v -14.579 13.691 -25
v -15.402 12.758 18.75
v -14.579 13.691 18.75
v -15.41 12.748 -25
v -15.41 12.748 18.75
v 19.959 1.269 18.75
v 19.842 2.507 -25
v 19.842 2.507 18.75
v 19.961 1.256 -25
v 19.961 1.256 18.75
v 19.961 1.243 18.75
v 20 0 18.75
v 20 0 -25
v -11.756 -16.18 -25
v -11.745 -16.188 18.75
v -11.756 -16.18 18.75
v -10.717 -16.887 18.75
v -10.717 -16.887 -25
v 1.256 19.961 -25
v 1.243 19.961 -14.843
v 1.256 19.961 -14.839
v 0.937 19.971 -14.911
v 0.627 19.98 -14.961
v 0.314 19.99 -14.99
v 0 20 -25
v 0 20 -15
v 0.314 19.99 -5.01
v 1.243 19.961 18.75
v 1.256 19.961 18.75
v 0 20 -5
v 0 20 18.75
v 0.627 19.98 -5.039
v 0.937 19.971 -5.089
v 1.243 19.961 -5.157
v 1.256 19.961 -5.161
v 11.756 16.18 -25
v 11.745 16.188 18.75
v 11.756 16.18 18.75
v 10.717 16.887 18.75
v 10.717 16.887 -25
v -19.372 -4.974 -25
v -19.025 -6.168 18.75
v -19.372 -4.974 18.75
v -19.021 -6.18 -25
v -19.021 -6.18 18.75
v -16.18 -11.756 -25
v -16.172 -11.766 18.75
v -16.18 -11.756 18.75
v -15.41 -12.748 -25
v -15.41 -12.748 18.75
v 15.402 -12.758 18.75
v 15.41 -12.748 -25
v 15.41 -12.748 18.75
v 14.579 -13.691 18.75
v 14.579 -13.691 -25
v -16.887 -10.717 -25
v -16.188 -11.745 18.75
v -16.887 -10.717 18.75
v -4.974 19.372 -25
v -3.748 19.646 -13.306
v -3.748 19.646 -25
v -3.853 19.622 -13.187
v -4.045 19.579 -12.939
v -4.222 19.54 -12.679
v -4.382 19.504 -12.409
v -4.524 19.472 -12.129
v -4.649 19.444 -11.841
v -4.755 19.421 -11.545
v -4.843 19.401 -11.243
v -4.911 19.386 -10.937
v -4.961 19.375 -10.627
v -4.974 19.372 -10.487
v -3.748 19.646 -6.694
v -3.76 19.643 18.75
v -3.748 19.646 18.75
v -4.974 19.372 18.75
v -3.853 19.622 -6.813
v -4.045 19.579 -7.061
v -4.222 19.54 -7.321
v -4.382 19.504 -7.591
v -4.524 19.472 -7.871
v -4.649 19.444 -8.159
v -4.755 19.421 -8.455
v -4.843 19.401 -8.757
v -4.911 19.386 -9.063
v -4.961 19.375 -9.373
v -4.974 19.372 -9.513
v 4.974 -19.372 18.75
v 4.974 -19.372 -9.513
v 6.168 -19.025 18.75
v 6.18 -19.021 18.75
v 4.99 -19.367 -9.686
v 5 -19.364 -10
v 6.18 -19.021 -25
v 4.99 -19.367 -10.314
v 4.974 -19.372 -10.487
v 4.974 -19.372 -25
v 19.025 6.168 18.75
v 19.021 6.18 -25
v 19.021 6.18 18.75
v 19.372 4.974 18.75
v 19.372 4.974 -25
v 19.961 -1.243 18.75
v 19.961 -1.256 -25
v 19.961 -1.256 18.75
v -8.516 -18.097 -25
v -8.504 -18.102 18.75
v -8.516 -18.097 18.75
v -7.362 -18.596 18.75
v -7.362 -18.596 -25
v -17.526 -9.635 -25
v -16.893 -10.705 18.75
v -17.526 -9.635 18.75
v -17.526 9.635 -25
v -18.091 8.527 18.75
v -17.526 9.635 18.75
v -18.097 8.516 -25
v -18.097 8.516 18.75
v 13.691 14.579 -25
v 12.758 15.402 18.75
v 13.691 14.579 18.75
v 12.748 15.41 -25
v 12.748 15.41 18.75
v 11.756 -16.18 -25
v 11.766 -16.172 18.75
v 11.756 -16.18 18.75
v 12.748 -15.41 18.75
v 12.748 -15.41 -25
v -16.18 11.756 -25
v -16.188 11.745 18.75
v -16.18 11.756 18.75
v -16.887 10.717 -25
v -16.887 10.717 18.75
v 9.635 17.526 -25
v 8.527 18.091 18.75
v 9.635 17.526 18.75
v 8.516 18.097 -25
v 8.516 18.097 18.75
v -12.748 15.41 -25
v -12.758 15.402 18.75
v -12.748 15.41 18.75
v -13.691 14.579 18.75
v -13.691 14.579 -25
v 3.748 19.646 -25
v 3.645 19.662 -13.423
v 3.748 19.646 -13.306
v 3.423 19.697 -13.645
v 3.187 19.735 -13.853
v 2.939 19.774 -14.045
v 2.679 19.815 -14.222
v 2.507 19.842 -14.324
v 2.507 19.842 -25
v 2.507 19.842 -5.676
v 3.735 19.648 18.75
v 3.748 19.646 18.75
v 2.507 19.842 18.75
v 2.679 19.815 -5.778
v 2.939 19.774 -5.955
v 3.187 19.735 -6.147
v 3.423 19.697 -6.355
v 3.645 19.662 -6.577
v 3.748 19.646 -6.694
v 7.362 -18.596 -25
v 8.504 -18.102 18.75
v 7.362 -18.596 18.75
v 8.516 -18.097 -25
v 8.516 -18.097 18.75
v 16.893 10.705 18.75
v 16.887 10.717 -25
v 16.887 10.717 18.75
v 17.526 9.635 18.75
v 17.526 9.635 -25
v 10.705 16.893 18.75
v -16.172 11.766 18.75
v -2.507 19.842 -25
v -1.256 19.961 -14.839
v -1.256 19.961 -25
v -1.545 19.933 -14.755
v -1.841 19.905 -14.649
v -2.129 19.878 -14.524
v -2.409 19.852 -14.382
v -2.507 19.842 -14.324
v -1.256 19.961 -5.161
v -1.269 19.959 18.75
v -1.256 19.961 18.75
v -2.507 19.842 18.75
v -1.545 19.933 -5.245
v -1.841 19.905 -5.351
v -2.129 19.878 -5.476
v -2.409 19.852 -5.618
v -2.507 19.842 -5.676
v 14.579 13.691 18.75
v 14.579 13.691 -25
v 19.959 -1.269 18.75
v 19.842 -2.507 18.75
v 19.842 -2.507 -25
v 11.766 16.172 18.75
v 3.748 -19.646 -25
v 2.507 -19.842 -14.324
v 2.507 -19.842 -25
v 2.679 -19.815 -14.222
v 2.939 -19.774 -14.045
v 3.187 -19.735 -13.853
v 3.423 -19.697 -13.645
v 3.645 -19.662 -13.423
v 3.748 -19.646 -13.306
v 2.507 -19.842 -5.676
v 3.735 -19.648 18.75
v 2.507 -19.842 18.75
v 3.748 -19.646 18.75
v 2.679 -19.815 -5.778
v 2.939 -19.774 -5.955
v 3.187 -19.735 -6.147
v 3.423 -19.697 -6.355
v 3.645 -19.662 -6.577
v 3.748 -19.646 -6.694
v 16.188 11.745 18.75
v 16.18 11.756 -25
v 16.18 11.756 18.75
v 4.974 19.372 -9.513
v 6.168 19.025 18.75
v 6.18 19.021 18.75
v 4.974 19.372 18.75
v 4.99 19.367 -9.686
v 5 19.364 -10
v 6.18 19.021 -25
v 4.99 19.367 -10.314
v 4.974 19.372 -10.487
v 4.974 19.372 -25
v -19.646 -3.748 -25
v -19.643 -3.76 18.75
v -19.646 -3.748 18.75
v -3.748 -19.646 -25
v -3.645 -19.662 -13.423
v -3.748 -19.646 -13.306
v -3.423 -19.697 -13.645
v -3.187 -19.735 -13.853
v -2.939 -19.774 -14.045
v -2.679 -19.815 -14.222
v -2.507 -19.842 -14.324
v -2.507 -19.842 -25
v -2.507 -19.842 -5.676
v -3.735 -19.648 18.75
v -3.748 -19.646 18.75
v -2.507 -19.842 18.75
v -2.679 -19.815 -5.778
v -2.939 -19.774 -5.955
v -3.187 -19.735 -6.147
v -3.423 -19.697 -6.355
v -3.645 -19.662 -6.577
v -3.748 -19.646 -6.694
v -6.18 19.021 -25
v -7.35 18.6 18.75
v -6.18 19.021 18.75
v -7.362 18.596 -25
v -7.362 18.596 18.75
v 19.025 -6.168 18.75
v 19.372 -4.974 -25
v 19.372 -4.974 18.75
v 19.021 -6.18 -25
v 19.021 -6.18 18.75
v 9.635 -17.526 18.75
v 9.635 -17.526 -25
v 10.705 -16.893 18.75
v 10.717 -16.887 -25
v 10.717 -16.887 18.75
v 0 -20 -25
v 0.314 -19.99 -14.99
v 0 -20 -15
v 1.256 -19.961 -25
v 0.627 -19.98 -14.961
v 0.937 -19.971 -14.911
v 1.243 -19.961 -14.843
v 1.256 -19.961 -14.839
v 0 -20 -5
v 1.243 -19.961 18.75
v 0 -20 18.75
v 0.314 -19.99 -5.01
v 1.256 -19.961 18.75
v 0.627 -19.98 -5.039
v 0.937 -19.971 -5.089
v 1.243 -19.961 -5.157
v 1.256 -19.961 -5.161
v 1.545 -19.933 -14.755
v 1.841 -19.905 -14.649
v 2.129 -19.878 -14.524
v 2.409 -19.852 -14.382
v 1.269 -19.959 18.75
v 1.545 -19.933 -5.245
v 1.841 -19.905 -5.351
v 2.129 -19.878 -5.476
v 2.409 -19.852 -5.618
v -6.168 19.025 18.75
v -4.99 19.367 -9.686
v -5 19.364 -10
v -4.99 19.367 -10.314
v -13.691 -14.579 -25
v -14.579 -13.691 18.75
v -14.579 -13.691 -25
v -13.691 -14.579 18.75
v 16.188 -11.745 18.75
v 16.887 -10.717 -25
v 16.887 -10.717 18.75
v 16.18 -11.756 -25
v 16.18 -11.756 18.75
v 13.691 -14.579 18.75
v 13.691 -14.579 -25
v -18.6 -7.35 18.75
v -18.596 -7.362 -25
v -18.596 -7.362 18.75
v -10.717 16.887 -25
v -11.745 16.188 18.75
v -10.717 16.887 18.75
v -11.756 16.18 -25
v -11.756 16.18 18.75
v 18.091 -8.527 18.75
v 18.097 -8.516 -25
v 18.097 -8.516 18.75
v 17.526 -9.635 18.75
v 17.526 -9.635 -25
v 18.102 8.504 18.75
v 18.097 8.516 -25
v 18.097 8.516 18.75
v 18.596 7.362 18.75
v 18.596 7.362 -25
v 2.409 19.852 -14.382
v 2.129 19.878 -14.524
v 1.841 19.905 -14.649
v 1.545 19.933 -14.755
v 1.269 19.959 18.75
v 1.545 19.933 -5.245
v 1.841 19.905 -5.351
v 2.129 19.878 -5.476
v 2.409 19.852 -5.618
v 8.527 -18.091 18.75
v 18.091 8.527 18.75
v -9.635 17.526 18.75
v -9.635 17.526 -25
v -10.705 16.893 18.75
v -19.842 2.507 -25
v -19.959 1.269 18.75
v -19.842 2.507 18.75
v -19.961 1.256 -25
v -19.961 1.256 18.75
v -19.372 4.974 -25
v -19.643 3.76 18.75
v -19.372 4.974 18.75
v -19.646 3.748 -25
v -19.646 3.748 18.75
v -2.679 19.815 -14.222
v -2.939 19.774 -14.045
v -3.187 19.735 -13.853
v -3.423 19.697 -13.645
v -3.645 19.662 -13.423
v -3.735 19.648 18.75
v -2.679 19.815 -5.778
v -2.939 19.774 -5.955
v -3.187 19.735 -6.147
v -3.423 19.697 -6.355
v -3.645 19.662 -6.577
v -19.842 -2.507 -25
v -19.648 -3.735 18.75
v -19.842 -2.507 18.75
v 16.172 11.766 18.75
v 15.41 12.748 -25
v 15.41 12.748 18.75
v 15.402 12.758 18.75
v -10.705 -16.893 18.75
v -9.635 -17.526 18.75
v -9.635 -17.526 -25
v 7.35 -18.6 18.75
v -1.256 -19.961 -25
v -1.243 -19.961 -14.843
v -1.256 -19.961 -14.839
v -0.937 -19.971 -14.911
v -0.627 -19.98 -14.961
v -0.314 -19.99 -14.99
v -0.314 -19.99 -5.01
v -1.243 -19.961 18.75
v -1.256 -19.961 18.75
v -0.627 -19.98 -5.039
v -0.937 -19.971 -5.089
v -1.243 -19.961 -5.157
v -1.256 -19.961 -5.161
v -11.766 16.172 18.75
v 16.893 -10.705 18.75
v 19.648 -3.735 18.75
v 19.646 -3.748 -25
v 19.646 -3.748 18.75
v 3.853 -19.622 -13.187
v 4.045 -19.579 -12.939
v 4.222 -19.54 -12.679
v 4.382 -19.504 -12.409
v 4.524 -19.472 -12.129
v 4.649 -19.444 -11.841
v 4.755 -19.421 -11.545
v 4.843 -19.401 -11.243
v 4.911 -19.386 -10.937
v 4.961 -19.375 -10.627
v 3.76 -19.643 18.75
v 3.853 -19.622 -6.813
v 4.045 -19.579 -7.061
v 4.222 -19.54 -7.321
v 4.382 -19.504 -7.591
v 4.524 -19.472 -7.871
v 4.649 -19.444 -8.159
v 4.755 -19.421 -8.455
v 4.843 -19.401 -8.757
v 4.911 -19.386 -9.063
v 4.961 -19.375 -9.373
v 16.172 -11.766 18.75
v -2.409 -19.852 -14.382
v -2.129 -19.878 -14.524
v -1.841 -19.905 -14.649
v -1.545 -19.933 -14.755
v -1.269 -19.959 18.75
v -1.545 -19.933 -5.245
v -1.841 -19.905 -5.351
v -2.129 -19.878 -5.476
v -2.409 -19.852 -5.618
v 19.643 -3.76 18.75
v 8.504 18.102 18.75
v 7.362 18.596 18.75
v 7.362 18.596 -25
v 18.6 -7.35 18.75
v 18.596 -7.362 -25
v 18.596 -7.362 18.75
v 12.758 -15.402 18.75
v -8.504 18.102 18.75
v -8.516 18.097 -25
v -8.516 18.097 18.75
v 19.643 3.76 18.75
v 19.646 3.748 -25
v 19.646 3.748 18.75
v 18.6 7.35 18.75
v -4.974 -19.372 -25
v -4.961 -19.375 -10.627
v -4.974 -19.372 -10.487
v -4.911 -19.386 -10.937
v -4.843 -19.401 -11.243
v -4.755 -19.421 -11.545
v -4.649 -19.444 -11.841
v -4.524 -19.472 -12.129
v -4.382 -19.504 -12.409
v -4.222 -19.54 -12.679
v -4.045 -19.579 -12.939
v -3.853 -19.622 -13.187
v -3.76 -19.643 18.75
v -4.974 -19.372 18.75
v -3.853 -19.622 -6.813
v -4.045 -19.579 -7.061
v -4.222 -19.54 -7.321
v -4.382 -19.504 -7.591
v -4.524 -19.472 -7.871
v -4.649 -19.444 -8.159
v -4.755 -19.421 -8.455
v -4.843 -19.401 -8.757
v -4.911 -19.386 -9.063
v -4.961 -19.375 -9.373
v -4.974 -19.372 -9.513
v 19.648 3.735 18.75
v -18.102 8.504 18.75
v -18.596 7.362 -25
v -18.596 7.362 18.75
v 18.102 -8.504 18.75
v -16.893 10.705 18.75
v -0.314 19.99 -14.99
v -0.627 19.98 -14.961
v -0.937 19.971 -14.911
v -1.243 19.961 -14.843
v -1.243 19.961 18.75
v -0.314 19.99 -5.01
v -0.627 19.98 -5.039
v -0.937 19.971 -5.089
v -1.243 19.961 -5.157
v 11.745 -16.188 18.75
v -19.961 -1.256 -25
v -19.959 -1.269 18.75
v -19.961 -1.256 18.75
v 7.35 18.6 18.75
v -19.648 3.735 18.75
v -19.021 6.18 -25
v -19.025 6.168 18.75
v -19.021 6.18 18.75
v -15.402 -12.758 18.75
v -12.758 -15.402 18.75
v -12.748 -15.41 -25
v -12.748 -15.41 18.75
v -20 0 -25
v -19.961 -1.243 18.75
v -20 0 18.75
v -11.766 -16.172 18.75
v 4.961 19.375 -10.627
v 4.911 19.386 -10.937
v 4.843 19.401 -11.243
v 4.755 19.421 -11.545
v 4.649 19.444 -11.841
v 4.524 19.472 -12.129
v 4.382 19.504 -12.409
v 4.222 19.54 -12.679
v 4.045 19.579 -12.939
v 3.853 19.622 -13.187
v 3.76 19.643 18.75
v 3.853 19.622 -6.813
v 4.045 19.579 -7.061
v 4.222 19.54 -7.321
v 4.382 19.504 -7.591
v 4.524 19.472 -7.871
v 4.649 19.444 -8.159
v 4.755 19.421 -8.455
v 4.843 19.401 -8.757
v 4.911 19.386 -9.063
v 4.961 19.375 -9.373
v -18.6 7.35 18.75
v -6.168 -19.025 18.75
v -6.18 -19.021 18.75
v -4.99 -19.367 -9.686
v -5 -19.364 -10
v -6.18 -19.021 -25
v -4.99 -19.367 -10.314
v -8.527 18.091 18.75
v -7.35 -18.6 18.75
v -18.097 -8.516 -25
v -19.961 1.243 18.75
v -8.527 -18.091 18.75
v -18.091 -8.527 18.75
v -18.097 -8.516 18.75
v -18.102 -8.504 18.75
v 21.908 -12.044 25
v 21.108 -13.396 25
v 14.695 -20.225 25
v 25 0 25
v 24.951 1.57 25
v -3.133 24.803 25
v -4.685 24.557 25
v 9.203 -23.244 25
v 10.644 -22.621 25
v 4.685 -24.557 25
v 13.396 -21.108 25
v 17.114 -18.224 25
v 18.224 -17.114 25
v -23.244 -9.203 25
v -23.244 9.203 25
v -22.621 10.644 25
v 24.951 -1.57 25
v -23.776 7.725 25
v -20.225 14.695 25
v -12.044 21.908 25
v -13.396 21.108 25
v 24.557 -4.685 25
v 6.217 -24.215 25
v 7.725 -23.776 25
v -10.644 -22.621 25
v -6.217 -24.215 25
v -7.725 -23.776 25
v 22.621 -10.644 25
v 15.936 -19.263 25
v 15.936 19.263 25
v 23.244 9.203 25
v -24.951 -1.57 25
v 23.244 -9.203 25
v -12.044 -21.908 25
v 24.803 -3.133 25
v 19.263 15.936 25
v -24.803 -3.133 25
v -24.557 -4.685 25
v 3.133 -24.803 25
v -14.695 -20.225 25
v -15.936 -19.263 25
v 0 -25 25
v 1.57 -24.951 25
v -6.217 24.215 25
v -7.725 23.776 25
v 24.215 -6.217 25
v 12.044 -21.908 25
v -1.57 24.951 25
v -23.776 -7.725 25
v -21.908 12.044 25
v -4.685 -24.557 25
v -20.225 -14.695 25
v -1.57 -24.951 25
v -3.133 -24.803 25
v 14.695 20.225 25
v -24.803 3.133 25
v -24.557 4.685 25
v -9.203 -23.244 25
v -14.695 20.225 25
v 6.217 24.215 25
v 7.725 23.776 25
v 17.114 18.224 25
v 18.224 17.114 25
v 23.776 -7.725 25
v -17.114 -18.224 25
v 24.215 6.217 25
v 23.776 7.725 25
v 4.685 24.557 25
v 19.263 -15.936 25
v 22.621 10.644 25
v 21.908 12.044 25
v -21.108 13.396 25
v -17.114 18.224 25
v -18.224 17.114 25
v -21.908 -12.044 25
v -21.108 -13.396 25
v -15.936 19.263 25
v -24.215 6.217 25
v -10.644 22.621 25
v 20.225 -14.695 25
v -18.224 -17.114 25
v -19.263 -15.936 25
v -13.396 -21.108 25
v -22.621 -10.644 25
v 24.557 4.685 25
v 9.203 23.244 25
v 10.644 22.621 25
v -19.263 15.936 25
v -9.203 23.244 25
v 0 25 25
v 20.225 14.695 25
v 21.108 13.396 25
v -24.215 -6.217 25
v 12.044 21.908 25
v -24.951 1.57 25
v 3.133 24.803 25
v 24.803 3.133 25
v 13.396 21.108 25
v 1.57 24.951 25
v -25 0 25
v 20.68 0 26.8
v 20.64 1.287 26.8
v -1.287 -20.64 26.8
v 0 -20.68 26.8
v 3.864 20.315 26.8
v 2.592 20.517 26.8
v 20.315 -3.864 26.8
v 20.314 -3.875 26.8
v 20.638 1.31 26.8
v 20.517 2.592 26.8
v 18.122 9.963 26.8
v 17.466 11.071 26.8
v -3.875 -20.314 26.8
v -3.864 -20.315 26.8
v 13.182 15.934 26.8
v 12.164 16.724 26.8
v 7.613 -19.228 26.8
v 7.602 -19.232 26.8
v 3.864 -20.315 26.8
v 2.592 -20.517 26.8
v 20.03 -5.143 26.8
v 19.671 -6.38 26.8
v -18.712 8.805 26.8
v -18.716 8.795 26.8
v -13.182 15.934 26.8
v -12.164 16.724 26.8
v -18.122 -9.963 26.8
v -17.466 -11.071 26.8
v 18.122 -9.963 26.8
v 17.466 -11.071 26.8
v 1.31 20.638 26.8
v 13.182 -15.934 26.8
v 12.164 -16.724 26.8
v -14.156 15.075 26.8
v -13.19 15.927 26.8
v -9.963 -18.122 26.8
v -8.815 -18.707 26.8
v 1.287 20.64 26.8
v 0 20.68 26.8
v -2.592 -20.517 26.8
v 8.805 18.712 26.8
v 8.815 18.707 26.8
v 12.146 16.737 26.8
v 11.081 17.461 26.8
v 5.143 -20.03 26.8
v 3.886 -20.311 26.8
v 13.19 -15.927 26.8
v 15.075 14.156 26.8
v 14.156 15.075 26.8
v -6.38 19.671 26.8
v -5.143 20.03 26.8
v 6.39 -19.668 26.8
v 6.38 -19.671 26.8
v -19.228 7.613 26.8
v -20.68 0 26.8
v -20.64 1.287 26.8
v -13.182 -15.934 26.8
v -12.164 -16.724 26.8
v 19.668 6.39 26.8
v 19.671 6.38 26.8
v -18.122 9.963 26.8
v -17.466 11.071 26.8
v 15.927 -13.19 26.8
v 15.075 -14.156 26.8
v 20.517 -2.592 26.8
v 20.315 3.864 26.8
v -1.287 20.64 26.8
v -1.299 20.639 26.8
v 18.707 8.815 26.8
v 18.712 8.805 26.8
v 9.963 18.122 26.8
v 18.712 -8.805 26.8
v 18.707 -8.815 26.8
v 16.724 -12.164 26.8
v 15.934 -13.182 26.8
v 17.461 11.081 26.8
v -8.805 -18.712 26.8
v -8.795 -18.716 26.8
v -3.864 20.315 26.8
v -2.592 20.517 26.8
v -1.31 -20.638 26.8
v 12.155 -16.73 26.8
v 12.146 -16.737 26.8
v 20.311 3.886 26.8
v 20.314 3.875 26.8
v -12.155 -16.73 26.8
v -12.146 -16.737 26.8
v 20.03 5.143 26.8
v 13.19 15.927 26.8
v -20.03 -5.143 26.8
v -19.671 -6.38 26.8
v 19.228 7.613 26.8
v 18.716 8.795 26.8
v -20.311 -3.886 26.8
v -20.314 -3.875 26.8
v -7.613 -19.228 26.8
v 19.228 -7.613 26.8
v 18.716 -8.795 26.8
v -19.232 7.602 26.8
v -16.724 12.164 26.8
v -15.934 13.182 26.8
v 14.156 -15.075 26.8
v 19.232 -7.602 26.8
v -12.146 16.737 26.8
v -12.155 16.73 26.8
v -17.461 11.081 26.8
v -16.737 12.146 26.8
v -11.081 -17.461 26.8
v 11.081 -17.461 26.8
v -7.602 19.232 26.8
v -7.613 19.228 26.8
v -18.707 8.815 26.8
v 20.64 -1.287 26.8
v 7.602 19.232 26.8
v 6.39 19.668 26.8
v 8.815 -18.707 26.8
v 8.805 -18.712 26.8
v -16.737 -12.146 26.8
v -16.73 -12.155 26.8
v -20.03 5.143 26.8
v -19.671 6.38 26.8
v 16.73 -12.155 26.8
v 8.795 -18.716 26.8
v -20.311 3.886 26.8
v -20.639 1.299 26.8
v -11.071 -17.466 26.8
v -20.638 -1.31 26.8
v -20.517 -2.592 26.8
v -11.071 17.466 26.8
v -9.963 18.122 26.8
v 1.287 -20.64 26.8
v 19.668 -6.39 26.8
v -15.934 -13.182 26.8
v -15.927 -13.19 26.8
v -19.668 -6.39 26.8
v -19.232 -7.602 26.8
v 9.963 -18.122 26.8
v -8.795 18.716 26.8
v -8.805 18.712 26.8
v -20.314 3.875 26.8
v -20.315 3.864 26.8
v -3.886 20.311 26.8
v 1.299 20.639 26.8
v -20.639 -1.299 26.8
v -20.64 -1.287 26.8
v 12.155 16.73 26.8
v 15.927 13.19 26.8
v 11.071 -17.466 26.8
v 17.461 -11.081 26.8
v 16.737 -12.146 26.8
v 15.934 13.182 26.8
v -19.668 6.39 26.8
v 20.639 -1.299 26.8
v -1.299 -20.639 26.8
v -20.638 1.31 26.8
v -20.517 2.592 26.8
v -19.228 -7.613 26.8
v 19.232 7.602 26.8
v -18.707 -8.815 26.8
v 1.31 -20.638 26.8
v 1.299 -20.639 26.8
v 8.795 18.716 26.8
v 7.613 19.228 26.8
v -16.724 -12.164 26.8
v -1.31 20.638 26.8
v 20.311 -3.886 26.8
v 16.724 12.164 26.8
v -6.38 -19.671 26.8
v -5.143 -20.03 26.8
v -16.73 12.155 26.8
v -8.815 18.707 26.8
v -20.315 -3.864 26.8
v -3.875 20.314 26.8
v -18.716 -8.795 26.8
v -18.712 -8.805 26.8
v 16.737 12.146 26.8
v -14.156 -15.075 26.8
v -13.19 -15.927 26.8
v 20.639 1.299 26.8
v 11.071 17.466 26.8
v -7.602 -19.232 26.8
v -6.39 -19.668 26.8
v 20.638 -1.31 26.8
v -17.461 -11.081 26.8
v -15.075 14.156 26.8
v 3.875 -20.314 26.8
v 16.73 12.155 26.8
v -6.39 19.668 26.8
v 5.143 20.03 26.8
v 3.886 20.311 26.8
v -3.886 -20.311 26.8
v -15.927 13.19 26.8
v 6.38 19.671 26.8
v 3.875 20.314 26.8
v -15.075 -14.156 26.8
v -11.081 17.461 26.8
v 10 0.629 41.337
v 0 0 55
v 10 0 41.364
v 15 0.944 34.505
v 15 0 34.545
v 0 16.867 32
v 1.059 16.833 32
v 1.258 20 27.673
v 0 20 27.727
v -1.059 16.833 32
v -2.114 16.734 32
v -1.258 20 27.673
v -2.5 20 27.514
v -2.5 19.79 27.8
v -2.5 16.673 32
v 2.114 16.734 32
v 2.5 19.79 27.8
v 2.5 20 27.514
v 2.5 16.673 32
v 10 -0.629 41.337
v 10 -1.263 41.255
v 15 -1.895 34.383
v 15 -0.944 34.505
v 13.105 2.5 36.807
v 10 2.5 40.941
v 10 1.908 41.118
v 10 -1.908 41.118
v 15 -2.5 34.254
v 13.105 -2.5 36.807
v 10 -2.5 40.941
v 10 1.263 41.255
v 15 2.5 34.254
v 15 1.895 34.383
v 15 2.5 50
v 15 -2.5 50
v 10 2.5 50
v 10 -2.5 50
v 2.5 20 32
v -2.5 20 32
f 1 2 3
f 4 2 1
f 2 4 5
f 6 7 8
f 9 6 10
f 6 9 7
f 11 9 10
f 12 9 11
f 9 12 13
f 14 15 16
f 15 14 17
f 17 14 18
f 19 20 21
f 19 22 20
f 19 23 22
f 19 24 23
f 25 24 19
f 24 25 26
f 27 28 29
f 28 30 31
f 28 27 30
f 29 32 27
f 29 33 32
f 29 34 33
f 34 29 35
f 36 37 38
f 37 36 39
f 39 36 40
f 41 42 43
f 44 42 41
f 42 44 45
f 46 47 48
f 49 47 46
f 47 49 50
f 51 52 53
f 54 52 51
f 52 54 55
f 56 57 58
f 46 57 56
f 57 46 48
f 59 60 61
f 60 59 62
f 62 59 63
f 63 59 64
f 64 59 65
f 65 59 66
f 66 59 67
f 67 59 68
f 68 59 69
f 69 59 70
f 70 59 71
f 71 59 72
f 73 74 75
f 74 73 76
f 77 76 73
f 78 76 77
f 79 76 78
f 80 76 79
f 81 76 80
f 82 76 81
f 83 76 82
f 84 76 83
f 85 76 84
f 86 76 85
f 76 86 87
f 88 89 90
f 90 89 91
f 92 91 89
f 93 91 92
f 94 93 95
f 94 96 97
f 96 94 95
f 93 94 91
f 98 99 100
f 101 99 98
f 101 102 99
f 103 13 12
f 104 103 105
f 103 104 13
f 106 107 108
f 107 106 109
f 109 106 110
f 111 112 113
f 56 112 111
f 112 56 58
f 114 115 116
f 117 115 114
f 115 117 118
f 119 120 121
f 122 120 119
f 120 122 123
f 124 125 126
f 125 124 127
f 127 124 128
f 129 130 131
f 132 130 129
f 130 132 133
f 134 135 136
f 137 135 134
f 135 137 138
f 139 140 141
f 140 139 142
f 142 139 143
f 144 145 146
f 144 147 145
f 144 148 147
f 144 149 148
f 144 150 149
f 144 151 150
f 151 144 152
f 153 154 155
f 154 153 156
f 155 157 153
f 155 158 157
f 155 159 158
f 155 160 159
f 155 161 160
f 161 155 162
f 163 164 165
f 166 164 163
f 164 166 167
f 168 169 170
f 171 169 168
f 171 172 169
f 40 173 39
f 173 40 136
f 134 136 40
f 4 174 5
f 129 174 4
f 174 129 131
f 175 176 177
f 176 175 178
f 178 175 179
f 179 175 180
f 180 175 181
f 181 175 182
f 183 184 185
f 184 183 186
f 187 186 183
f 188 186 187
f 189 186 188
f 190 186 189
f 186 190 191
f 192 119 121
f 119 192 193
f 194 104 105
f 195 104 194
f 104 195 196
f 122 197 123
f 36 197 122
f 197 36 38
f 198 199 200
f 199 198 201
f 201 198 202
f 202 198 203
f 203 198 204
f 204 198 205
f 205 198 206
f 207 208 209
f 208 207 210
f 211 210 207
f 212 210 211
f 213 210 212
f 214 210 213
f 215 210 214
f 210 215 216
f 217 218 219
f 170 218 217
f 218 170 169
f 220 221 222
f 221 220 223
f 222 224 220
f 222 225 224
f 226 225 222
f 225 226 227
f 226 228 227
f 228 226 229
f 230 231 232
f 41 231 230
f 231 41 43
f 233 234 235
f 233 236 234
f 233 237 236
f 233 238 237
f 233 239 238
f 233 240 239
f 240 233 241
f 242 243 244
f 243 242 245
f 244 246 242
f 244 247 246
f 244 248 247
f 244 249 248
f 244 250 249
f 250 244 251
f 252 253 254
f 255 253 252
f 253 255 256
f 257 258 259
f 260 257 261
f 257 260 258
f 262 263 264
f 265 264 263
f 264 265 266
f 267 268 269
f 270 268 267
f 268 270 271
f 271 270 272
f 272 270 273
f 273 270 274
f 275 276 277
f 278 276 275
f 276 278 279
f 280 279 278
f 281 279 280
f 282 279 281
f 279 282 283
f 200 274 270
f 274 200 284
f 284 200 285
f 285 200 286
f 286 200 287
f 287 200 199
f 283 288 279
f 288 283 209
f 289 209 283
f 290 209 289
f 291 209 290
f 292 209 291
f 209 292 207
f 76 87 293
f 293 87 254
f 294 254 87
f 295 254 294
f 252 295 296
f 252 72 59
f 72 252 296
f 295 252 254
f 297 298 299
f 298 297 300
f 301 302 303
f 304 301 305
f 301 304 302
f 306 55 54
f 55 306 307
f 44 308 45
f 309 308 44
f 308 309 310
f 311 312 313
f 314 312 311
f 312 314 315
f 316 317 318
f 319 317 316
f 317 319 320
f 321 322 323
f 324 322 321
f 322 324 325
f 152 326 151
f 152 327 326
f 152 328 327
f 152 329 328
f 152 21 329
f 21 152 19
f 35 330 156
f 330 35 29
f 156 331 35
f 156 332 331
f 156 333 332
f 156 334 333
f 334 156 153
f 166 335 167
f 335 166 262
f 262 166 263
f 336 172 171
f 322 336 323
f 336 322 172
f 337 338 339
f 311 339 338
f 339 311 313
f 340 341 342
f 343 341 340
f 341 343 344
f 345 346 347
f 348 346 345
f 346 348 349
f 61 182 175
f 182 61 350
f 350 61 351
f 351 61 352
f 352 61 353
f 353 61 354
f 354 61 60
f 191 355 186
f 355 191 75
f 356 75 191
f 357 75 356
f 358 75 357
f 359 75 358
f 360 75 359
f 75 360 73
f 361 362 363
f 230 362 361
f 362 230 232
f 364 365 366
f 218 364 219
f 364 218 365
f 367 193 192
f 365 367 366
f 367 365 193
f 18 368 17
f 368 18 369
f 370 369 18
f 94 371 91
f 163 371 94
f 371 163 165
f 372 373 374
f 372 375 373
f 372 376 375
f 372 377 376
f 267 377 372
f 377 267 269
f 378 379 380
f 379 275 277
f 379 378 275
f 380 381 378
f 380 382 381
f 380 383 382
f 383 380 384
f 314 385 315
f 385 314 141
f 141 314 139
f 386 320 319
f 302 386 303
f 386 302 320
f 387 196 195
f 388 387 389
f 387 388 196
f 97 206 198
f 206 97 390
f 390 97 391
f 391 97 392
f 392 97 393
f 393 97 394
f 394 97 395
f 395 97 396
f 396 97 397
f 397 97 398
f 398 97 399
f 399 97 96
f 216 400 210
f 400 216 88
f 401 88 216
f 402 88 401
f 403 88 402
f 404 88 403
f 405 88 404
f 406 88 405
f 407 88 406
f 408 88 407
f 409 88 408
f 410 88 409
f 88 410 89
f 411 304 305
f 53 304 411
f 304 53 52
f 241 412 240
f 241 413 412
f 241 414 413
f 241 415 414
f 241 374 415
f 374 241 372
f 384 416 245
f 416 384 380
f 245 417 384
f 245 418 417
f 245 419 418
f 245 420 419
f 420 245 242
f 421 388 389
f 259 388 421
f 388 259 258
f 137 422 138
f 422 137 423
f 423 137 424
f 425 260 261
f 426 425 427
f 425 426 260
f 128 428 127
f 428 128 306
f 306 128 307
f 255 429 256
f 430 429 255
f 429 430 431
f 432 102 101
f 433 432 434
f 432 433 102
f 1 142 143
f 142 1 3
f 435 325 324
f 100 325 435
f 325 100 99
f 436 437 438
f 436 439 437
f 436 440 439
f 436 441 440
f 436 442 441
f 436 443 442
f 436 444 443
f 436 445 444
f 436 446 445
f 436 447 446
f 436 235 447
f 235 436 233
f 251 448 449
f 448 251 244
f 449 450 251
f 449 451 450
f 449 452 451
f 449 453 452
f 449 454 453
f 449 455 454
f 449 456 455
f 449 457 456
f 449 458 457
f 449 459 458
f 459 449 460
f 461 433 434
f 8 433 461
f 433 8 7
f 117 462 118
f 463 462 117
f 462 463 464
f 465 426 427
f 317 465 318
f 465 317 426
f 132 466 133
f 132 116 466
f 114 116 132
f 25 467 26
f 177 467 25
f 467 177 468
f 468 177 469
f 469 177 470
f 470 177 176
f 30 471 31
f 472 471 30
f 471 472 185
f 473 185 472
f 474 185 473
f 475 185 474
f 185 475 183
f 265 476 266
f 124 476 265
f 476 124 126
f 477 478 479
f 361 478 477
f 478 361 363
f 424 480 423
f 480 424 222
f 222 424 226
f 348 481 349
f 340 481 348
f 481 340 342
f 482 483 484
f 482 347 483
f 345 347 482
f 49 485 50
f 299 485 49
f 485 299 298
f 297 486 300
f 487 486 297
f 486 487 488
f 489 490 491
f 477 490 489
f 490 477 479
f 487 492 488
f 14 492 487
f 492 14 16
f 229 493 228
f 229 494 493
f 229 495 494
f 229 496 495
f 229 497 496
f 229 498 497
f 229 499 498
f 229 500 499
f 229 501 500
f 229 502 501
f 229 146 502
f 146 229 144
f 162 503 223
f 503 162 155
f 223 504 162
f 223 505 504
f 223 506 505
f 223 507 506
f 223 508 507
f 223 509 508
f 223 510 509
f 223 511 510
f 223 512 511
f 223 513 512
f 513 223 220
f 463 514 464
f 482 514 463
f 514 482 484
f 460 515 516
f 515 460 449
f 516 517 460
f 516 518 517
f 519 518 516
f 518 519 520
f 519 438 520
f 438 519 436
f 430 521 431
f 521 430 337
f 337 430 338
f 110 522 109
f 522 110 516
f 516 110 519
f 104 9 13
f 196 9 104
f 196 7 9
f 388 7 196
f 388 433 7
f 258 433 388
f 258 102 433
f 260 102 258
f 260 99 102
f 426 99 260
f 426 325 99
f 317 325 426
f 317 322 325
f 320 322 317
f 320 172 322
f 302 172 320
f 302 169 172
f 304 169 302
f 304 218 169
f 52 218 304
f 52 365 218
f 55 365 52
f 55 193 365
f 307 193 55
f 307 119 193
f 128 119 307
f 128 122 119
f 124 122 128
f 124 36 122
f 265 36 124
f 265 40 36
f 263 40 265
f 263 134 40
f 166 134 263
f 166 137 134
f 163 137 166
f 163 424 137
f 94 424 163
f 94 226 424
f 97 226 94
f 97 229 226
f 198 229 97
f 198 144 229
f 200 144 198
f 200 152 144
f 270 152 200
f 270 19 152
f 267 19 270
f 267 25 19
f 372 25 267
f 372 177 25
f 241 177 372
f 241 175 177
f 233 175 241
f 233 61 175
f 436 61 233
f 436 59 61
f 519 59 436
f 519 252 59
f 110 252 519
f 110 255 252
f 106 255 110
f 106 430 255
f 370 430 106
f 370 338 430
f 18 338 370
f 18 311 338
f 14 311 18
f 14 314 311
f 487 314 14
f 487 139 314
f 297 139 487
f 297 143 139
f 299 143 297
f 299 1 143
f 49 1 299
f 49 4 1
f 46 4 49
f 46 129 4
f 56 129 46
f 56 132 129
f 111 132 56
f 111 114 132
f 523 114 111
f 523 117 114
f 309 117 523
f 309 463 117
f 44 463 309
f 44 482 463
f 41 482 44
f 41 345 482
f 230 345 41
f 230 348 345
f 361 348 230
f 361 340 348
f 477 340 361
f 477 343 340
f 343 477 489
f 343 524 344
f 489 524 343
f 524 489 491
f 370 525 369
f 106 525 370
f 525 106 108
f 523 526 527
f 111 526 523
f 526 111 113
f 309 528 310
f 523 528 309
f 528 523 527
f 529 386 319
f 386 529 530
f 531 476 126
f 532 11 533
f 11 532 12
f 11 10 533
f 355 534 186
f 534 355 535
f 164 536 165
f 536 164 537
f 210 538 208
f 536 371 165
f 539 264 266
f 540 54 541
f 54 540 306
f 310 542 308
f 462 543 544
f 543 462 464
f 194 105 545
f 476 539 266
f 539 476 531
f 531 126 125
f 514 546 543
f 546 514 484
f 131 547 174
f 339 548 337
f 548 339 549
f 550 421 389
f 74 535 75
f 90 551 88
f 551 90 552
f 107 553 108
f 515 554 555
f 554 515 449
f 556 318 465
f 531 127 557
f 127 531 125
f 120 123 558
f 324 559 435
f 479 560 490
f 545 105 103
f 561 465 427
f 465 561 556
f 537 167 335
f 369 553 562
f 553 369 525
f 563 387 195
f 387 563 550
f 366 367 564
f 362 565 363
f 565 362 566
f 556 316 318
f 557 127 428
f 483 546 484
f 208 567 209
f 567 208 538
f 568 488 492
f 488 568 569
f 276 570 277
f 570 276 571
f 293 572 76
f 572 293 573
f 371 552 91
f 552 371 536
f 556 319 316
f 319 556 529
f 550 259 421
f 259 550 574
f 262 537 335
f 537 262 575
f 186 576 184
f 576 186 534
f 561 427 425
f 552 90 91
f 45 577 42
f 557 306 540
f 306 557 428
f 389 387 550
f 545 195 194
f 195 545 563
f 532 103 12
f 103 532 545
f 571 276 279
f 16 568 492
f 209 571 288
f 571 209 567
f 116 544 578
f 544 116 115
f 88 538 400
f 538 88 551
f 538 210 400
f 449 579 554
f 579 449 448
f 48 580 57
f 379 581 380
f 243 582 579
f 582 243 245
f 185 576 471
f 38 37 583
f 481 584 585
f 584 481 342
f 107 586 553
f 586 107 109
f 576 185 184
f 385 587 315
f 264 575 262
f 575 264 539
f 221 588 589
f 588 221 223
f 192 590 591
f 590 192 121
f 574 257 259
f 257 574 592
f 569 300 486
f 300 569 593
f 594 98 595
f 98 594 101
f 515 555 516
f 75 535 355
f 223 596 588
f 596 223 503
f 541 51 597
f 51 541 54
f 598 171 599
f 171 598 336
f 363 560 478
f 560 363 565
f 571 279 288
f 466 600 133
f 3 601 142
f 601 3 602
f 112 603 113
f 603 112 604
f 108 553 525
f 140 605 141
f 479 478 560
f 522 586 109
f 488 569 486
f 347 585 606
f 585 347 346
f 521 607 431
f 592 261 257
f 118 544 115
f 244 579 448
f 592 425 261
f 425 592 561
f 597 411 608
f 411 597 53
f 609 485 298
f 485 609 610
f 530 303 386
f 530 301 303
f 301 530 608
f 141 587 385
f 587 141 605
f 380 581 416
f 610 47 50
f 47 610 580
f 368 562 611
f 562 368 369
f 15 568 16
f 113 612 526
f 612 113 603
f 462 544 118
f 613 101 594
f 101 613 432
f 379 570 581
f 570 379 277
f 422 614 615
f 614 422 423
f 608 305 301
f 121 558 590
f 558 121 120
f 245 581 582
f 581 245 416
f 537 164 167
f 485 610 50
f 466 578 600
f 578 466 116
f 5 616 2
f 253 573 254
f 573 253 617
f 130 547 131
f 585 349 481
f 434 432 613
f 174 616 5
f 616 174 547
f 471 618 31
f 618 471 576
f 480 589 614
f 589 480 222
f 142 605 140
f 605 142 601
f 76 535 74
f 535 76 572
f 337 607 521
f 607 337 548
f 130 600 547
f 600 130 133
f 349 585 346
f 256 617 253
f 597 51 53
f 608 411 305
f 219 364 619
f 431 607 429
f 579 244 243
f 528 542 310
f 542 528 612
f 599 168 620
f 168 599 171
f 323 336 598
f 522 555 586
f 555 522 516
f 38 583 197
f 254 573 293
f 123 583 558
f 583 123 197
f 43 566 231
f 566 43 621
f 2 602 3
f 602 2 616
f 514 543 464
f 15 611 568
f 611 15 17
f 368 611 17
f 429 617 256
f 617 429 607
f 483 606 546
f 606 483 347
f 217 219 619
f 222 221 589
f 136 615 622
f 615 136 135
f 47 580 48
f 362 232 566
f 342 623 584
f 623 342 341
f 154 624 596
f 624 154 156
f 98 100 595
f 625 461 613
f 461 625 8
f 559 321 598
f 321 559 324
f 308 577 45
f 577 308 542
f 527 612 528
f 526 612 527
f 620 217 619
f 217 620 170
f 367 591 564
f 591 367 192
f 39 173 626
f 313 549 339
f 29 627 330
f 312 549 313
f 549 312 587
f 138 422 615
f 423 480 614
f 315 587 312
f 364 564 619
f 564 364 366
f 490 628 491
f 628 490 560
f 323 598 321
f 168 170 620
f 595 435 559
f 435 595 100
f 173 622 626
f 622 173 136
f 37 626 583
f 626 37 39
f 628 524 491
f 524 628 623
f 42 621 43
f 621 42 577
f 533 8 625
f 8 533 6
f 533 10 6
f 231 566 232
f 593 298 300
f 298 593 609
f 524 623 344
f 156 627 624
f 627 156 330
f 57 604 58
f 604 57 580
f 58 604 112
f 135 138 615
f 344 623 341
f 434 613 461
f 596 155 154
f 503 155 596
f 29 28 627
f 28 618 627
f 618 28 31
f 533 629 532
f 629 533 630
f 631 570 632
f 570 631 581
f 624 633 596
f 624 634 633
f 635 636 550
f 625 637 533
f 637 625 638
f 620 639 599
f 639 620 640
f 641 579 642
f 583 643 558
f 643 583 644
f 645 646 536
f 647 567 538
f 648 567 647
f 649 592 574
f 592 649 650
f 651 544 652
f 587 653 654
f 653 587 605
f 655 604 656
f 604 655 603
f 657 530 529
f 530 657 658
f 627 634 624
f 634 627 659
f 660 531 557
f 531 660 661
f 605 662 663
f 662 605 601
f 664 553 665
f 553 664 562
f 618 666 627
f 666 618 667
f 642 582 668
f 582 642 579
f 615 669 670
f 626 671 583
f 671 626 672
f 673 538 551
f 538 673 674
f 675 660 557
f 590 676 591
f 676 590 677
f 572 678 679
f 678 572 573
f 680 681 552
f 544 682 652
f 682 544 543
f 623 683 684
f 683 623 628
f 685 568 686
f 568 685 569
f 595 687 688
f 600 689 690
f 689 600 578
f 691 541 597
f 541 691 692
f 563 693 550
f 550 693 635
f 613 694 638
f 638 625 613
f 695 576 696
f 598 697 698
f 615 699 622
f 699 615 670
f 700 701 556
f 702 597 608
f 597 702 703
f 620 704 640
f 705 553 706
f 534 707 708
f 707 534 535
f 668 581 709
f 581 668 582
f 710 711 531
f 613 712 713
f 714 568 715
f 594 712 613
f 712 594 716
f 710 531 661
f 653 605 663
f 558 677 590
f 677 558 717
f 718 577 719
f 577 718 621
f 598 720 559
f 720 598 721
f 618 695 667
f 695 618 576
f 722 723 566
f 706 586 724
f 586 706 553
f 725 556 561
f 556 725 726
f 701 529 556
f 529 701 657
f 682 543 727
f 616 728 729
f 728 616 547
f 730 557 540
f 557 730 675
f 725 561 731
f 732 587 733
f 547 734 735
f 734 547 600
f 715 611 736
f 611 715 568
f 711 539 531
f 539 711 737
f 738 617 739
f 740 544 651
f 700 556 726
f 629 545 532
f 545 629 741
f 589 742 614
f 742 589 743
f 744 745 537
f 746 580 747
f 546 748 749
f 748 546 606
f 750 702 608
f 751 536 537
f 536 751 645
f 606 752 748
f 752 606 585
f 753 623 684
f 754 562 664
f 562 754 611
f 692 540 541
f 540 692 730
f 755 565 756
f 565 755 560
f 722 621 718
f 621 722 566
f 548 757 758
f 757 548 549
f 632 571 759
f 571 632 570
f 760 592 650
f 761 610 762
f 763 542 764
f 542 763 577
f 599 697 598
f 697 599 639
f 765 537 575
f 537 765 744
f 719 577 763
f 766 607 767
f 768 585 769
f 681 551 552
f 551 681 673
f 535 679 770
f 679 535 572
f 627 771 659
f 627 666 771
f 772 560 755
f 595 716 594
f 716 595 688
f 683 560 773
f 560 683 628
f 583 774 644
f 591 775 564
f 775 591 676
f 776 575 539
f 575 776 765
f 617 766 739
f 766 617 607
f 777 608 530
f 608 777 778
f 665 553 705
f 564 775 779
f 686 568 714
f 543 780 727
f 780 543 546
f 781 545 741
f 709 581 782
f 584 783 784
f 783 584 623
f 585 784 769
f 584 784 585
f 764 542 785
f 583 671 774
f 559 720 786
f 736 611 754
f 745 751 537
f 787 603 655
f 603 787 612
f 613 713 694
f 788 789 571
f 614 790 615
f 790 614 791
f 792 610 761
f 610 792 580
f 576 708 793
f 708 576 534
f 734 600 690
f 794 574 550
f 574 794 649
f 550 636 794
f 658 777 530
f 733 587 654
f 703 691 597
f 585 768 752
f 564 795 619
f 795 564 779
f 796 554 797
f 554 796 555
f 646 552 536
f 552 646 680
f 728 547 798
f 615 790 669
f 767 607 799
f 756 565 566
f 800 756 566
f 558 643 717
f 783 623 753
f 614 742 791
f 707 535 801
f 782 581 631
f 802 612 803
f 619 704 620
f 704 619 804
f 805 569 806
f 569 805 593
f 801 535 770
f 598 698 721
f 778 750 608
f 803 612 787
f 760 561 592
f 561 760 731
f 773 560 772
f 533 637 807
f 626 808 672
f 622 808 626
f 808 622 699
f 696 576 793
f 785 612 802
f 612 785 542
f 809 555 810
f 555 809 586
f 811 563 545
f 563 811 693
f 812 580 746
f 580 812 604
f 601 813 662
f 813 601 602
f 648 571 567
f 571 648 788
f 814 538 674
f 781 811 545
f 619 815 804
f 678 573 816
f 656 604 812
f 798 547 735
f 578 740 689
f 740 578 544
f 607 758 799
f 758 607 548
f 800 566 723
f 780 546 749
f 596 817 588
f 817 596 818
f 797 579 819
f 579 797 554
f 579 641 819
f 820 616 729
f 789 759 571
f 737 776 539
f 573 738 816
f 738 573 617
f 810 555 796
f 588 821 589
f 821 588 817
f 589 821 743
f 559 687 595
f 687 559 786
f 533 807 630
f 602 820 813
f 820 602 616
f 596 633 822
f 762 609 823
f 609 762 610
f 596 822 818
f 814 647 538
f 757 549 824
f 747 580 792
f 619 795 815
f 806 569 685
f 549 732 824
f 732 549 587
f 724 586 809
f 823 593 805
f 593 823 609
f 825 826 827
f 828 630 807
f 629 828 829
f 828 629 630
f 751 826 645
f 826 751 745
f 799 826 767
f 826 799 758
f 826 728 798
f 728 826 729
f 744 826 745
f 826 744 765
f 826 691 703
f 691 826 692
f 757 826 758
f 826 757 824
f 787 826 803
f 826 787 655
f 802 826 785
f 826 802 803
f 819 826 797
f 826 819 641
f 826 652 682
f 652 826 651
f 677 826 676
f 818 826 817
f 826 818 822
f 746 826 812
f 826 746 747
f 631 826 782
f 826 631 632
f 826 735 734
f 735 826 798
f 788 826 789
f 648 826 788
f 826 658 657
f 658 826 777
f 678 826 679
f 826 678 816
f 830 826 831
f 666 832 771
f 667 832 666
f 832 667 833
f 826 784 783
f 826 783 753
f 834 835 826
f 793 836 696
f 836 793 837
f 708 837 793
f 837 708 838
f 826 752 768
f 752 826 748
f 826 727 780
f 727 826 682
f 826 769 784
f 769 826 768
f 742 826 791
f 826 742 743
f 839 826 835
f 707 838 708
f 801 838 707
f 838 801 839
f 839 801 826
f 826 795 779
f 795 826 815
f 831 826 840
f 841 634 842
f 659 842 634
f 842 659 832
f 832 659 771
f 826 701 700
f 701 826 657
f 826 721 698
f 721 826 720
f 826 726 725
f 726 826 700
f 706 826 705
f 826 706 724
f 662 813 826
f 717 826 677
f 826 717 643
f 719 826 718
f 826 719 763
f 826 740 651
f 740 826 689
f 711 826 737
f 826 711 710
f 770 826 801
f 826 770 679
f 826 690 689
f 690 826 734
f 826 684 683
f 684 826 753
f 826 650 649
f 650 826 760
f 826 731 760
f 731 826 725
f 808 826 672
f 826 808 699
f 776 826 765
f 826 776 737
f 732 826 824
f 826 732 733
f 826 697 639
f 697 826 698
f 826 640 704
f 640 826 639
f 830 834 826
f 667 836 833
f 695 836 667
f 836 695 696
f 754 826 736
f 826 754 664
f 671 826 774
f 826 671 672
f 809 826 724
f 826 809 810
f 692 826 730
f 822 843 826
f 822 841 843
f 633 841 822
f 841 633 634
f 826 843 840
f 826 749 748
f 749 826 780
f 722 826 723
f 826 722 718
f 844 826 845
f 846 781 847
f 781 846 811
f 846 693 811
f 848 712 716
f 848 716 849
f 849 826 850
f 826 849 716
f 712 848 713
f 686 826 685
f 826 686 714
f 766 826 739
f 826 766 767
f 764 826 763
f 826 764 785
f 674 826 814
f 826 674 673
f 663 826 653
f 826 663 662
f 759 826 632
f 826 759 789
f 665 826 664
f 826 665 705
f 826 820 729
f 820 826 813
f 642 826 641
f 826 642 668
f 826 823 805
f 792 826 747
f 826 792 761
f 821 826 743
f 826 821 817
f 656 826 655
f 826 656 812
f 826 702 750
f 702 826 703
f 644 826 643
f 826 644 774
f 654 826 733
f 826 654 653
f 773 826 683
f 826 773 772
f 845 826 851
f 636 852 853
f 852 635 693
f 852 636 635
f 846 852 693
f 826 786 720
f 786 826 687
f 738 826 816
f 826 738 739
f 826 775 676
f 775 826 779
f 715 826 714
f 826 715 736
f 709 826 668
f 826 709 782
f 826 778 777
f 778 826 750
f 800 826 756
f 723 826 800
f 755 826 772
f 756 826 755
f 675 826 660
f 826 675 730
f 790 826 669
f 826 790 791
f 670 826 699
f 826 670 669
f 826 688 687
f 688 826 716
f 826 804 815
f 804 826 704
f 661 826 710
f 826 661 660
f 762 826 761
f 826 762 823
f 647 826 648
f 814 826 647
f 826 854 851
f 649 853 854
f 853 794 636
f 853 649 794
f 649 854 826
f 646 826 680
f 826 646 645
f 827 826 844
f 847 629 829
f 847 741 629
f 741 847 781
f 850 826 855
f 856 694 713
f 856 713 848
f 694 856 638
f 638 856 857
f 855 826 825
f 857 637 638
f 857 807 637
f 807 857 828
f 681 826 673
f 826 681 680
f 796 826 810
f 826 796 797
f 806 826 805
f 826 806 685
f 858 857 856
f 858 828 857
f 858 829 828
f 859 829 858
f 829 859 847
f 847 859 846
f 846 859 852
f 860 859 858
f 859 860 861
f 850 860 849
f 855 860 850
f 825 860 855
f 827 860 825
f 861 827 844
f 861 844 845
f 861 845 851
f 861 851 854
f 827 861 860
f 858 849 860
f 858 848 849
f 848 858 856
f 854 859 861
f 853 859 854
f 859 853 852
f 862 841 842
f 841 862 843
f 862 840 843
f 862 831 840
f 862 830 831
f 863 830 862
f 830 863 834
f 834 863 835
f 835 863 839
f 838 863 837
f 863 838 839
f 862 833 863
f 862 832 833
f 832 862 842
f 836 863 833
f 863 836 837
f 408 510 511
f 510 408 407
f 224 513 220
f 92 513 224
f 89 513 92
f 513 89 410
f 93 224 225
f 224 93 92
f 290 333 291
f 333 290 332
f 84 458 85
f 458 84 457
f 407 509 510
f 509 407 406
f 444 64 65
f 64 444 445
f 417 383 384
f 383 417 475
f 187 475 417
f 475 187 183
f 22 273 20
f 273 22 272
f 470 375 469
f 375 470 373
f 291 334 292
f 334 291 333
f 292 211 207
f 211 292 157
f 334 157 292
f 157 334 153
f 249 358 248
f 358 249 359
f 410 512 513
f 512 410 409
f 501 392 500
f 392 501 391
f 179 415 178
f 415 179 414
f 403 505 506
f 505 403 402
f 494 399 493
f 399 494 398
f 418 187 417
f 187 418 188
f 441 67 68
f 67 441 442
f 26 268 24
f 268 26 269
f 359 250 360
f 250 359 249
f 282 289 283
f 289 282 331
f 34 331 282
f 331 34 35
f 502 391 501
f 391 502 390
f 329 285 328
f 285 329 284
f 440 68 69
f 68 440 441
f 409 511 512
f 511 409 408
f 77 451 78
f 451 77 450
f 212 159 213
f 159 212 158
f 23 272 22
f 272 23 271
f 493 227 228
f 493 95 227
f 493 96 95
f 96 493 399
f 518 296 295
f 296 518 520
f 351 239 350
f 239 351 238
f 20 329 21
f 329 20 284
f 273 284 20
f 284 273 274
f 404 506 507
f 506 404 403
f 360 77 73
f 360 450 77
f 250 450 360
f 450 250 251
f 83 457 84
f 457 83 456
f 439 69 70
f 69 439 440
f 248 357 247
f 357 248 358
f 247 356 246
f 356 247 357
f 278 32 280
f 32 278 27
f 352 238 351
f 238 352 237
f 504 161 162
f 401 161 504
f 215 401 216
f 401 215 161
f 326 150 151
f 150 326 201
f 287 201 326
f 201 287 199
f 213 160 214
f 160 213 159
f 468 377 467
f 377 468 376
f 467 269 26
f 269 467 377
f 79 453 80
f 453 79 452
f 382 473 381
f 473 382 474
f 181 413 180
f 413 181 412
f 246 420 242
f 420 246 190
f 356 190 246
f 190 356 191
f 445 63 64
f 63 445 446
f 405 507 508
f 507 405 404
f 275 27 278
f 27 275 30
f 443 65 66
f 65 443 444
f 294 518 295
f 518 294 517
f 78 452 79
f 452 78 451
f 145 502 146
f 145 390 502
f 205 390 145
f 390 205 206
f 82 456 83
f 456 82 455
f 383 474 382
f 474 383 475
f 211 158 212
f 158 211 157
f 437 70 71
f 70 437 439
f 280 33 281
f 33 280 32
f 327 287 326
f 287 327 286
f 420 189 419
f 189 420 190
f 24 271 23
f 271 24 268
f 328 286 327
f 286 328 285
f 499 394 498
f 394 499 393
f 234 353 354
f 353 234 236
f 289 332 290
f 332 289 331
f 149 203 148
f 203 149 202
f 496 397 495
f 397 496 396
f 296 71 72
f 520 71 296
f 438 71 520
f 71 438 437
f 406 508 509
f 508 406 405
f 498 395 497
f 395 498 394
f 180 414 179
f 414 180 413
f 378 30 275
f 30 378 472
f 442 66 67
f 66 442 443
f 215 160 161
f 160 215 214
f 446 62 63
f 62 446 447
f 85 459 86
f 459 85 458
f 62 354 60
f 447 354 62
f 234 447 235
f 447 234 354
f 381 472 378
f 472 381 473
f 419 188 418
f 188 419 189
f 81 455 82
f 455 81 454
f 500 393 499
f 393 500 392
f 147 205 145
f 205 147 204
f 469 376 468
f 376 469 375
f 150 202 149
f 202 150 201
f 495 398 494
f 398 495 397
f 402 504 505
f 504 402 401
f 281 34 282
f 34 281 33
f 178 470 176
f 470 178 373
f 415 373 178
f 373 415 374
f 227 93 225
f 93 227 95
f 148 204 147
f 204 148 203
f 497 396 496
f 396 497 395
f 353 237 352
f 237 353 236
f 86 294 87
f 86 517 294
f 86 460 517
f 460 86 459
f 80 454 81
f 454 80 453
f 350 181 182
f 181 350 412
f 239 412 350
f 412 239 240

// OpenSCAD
 $fn=100;
module tourjeannedarc()
{difference(){
union(){cylinder(h=50,r=20,center= true);
		translate([0, 0, 10])
			cylinder(h = 30, r2 = 25, center = true);
		translate([0, 0, 30])
			cylinder(h = 10, r1 = 25, center = true);
		translate([0, 0, 40])
			cylinder(h = 30, r1 = 22,r2=0, center = true);
translate([10,-2.5,30])
cube([5,5,20]);
translate([-2.5,15,25])
cube([5,5,7]);
	}
translate([0,0,-10])
rotate([90, 0, 0])
cylinder(h=100,r=5,center= true);}
}
tourjeannedarc();
